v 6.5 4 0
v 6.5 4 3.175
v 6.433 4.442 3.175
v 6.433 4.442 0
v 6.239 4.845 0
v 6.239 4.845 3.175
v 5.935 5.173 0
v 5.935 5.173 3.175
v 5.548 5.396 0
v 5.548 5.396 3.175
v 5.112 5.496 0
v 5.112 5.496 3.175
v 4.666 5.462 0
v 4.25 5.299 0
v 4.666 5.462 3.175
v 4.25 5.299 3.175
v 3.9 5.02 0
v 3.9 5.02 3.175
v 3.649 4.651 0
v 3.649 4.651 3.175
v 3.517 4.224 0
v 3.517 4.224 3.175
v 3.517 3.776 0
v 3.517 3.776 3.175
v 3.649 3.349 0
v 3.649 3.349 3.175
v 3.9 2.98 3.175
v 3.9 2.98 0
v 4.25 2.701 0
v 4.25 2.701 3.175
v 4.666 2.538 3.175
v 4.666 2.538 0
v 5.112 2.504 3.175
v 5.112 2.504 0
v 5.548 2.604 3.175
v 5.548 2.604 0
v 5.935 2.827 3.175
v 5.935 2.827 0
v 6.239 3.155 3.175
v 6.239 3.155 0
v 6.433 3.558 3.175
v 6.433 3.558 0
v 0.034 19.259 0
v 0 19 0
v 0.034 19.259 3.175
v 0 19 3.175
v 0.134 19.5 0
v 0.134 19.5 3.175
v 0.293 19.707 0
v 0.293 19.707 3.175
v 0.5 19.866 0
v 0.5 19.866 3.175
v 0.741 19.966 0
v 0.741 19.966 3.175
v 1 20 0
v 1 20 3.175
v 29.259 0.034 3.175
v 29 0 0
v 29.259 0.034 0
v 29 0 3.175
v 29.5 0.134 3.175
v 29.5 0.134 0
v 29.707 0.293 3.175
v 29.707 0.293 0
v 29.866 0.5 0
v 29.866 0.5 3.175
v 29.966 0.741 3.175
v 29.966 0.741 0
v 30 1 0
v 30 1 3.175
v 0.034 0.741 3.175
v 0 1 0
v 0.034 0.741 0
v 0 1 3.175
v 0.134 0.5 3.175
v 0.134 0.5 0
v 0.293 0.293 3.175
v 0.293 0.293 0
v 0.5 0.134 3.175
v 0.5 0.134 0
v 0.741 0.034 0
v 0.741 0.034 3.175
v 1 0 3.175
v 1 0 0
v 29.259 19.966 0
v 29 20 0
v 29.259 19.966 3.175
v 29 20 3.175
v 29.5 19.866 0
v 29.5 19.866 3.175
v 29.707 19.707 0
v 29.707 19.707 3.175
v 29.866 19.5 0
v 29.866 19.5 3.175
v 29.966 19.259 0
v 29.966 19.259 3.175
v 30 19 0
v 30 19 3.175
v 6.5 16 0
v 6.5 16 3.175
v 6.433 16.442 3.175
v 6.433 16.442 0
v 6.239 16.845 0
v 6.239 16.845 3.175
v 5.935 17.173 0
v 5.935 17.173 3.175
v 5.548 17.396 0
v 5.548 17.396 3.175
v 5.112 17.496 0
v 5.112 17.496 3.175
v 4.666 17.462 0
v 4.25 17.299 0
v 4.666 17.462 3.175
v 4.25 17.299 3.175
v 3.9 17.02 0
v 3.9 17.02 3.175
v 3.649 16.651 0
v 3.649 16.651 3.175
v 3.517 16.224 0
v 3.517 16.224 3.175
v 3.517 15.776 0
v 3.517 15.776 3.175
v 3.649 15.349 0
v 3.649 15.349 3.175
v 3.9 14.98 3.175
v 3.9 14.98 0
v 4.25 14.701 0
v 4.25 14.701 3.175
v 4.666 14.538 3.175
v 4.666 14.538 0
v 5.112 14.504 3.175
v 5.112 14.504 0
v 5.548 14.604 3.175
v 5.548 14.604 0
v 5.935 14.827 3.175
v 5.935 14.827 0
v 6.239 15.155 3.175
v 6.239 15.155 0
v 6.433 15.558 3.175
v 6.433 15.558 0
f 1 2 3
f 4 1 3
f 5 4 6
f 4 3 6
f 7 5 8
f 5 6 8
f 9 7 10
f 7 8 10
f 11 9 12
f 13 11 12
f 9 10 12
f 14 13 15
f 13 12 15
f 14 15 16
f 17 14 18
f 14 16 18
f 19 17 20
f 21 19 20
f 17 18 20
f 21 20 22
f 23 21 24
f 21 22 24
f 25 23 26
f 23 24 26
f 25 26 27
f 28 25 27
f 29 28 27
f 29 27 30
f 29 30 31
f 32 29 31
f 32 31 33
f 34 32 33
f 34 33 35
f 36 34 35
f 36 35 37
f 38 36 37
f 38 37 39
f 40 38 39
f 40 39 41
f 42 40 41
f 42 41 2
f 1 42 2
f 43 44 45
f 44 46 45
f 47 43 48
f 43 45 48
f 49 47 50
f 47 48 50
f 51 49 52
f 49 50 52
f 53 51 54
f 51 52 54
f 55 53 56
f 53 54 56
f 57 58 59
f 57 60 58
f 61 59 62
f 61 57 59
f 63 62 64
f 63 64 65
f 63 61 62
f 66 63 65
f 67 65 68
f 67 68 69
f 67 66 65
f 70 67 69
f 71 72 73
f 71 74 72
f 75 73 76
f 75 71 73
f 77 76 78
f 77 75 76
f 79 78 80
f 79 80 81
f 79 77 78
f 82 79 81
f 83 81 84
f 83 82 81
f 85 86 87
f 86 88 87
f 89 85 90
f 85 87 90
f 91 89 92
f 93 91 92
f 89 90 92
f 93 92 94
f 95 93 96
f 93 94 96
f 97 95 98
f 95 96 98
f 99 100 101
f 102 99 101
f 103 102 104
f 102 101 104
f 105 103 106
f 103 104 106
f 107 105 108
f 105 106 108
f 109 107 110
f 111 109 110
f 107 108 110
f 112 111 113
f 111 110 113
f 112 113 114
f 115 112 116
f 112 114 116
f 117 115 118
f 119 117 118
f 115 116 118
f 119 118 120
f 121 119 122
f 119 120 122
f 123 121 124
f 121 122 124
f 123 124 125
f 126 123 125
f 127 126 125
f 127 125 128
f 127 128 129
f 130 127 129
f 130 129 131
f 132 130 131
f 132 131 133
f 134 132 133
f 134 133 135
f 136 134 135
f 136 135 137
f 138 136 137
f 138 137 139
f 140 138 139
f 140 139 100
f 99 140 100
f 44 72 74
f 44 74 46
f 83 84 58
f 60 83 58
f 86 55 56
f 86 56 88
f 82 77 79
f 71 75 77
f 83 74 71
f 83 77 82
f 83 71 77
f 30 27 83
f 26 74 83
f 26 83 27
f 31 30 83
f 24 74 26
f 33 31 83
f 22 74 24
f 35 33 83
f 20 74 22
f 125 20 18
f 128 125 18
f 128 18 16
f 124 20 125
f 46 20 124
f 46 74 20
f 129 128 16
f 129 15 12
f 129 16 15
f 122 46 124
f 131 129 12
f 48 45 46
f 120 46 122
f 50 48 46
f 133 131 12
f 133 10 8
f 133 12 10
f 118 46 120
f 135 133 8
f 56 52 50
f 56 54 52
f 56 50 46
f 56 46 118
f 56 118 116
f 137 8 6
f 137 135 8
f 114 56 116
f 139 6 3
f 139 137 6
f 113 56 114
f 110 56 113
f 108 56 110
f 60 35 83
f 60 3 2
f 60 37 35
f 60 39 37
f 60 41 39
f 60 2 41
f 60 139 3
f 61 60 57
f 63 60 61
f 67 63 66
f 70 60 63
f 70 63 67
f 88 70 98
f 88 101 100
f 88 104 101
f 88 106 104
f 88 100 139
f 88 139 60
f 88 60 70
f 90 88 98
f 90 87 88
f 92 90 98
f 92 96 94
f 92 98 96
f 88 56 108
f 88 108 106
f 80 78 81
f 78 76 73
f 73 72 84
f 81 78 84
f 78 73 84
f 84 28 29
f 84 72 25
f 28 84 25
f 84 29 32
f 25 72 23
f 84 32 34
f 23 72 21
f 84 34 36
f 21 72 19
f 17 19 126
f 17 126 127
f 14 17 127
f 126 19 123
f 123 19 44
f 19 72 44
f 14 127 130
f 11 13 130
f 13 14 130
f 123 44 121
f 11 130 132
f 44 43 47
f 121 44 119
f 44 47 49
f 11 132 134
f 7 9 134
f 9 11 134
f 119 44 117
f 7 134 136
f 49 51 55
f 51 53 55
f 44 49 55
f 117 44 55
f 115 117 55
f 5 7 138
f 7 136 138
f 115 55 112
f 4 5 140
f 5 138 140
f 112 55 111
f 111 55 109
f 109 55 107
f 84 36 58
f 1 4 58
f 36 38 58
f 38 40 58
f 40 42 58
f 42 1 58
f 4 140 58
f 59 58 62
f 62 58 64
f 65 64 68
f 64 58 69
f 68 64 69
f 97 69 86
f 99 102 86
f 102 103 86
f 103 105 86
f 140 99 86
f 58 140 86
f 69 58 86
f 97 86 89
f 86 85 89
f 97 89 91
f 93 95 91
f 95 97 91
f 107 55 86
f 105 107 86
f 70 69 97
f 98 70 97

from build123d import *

# Parameters (mm, degrees)
F0_W     = 30
F0_H     = 20
F1_DEPTH = 3.175
F2_R     = 1.5
F3_DEPTH = 25
F4_R     = 1


# Not quite as in the source:
# - a length typed as a fraction of an inch, garbled in the dataset ("3 / 203.2 mm" for 3/8 in), is restored


with BuildPart() as f1:
    # F0 (on Top) → F1 (new body)
    with BuildSketch(Plane.XY):
        with Locations((15, 10)):
            Rectangle(F0_W, F0_H)
    extrude(amount=F1_DEPTH)

    # F2 (on face) → F3 (cut)
    with BuildSketch(Plane.XY.offset(3.175)):
        with Locations((5, 16)):
            Circle(F2_R)
        with Locations((5, 4)):
            Circle(F2_R)
    extrude(amount=-F3_DEPTH, mode=Mode.SUBTRACT)

    # F4
    f4_edges = [f1.edges().sort_by_distance(p)[0] for p in [
        (0, 20, 1.5875),
        (30, 20, 1.5875),
        (30, 0, 1.5875),
        (0, 0, 1.5875),
    ]]
    fillet(f4_edges, radius=F4_R)


solid = f1.part
